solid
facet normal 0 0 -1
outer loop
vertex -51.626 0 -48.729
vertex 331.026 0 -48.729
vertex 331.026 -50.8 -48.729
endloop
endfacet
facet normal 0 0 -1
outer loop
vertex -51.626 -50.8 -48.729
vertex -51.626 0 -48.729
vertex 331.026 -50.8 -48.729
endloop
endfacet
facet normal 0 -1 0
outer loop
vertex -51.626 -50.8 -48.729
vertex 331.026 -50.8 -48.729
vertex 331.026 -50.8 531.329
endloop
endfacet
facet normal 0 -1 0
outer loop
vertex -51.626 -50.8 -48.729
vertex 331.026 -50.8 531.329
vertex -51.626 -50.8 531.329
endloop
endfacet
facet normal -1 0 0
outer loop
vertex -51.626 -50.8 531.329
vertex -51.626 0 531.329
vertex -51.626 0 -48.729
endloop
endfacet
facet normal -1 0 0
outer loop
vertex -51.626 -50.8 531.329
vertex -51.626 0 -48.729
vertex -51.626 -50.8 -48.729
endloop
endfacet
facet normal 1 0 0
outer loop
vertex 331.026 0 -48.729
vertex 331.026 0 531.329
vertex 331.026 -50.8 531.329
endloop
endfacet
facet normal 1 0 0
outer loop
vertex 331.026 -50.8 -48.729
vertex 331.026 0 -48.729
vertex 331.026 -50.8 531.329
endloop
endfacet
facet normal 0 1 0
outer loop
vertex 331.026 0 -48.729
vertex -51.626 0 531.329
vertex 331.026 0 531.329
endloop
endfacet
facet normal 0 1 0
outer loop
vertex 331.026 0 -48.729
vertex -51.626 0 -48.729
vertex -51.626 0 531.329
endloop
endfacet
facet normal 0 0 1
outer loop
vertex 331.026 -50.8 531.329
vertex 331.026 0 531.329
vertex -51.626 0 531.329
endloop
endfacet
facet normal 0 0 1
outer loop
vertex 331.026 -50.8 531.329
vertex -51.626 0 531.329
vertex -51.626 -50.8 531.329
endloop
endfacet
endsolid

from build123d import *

# Parameters (mm, degrees)
F0_W     = 103.2518744469
F0_H     = 97.4576771259
F1_DEPTH = 50.8
F2_DEPTH = 279.4
F3_DEPTH = 482.6


with BuildPart() as f1:
    # F0 (on Front) → F1 (new body)
    with BuildSketch(Plane.XZ):
        Rectangle(F0_W, F0_H)
    extrude(amount=F1_DEPTH)

    # F2 (add): a face of the model
    f2_faces = [f1.faces().sort_by_distance(p)[0] for p in [
        (51.6259372234, -25.4, 0),
    ]]
    extrude(f2_faces, amount=F2_DEPTH)

    # F3 (add): a face of the model
    f3_faces = [f1.faces().sort_by_distance(p)[0] for p in [
        (139.7, -25.4, 48.728838563),
    ]]
    extrude(f3_faces, amount=F3_DEPTH)


solid = f1.part
